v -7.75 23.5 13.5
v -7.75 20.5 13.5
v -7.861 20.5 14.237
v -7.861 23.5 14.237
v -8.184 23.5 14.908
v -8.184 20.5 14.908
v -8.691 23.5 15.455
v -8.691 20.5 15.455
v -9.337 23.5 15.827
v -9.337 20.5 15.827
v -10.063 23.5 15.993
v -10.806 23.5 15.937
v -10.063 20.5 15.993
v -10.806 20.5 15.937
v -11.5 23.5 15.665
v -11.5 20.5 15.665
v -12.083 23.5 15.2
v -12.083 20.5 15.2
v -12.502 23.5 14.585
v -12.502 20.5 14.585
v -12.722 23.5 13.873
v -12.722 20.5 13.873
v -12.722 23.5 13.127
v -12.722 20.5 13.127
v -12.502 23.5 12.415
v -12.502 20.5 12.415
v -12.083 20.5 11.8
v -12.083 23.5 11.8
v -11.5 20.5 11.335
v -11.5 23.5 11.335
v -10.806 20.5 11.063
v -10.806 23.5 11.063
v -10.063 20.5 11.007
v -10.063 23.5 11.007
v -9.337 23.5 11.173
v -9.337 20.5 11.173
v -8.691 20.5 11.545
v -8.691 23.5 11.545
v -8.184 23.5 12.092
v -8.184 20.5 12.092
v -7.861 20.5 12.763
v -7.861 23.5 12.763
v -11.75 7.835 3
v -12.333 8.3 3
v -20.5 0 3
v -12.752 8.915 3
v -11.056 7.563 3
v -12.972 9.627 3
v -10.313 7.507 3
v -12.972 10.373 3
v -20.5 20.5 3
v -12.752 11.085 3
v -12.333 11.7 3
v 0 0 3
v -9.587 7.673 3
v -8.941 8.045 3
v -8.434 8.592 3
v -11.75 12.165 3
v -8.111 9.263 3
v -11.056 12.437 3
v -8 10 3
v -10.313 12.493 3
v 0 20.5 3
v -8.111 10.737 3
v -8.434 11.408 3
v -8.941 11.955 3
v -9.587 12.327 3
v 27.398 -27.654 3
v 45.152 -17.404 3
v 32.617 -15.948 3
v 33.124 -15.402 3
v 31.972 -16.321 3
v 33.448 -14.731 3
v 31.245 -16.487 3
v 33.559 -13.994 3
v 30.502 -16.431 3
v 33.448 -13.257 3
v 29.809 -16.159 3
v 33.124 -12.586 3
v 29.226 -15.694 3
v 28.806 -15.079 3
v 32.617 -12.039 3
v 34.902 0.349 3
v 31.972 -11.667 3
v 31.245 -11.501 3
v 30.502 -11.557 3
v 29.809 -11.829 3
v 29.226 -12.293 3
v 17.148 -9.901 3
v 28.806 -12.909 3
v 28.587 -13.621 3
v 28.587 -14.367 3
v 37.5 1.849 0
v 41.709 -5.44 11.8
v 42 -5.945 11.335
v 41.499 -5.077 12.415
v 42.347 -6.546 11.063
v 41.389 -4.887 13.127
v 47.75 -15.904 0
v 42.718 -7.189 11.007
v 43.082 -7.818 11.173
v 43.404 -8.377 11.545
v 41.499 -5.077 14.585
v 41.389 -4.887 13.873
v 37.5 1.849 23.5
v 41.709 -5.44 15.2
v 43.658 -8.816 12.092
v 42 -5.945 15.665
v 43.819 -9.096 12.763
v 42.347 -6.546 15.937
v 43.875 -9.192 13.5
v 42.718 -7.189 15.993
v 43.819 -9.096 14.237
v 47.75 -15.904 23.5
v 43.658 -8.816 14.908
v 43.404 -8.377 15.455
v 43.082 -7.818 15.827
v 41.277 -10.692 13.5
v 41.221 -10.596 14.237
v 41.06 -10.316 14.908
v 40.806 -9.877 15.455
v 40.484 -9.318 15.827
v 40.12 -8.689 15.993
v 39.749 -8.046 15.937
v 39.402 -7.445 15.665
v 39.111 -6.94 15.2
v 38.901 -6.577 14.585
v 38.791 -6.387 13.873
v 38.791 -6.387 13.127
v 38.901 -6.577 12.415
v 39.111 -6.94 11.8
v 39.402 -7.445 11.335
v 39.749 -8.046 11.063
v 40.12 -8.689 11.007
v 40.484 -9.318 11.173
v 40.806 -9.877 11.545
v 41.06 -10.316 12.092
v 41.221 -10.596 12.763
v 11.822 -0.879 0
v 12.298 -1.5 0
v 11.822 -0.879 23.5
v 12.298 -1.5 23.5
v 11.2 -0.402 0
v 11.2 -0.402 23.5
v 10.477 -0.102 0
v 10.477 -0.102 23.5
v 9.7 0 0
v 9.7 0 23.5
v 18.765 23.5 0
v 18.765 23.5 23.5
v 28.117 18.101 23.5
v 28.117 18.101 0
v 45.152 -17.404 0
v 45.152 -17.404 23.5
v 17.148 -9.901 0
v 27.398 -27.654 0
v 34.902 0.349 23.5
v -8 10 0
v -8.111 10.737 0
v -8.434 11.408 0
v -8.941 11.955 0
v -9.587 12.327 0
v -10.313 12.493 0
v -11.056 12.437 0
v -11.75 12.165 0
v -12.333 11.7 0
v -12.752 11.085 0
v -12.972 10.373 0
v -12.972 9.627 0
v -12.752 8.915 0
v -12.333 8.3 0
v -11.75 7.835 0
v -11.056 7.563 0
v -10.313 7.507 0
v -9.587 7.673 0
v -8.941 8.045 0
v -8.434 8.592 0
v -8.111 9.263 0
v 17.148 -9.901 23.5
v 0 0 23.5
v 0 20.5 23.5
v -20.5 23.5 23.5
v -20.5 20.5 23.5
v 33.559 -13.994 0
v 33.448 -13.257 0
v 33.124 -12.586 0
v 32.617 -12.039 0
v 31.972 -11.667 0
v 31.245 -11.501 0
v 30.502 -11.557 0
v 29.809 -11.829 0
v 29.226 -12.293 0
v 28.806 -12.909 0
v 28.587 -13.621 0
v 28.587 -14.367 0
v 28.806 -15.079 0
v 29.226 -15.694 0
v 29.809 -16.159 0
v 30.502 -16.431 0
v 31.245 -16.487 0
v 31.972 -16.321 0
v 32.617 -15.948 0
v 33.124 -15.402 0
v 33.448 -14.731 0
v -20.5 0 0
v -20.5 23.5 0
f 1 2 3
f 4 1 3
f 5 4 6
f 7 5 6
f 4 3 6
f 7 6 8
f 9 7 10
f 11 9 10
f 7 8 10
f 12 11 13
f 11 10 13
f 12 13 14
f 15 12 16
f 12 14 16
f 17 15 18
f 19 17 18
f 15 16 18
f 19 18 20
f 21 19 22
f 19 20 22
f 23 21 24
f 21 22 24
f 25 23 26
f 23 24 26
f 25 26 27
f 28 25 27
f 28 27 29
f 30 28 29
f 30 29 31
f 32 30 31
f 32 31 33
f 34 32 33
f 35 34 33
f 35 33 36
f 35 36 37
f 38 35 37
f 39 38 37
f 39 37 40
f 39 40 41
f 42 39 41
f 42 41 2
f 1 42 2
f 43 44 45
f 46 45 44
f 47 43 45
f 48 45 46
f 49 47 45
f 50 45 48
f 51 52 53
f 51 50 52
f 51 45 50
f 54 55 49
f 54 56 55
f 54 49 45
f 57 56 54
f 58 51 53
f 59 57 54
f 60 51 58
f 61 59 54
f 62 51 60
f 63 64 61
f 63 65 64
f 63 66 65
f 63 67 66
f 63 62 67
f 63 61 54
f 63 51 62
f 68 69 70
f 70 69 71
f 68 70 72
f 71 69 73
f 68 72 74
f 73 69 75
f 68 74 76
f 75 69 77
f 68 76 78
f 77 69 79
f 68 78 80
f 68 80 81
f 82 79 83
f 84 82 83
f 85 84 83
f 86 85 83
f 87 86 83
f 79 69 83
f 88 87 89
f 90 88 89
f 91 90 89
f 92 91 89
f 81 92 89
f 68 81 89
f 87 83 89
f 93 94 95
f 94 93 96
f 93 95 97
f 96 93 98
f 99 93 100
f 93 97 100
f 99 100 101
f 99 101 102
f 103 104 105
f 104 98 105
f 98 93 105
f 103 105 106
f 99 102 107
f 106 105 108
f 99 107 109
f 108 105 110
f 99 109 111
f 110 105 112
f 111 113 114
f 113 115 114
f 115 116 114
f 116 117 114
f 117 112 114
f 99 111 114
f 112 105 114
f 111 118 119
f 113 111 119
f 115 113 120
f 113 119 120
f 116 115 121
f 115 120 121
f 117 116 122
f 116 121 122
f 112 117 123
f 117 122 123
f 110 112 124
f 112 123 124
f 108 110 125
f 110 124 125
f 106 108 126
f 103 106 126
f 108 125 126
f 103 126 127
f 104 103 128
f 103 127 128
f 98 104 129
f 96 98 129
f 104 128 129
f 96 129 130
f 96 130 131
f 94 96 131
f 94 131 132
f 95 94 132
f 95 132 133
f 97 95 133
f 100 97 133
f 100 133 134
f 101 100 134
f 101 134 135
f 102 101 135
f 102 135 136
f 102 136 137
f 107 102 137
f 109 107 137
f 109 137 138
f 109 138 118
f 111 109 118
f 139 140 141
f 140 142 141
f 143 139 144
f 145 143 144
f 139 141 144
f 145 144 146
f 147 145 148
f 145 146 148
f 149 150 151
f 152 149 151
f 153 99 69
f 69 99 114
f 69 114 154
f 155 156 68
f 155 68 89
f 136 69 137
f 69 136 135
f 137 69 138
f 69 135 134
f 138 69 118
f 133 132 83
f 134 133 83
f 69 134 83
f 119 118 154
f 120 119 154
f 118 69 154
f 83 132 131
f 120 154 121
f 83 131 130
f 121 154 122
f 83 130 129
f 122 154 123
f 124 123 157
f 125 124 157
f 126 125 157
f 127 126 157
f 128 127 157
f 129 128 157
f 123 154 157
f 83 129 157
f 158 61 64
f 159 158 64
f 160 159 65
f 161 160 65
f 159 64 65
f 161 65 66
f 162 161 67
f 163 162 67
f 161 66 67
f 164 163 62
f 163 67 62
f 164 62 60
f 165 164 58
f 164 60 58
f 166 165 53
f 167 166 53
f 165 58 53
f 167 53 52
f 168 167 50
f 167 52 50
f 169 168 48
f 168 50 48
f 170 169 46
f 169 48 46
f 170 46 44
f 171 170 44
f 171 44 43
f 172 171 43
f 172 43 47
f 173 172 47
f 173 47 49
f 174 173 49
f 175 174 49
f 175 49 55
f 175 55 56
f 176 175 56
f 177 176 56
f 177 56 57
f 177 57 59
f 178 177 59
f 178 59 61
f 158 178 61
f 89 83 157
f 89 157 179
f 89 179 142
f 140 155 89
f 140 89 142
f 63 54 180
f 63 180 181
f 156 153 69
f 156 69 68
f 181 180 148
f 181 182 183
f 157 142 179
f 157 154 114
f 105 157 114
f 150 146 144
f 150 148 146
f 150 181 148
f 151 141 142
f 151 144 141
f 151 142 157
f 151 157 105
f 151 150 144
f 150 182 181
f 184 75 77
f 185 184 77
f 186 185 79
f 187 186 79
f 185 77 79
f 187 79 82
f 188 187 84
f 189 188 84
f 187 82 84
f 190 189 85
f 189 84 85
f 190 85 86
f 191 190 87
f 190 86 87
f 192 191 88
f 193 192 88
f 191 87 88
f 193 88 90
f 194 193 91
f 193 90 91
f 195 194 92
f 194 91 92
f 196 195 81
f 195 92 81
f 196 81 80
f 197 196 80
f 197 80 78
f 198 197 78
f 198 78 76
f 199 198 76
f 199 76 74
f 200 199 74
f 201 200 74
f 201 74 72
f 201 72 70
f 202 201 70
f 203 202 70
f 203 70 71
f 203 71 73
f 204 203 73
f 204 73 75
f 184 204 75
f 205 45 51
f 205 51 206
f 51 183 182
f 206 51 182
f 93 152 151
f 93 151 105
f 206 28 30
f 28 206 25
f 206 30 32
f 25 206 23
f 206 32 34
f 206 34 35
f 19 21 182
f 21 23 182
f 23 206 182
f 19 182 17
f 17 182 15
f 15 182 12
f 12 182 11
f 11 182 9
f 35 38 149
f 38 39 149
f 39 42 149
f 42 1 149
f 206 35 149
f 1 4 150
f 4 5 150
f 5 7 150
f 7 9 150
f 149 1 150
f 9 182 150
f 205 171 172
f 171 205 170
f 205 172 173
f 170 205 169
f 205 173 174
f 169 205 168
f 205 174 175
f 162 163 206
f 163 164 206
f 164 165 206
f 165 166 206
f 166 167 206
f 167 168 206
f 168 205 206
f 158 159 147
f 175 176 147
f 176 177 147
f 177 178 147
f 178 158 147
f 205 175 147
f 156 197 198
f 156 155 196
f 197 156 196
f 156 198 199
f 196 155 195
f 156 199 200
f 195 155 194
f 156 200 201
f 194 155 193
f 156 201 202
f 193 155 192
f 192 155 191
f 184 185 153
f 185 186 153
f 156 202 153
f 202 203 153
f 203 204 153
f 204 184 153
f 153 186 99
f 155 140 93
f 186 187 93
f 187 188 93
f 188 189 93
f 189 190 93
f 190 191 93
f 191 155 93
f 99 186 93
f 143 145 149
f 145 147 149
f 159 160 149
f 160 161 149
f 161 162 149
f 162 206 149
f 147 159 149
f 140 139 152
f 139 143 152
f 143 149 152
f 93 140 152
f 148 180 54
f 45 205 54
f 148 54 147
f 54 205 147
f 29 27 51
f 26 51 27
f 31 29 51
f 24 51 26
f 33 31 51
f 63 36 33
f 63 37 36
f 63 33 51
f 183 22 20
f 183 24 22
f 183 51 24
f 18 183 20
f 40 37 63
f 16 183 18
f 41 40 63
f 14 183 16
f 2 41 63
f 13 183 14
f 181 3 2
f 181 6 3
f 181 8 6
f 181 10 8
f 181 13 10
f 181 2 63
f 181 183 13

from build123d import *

# Parameters (mm, degrees)
BOSS_EXTRUDE1_DEPTH   = 23.5
BOSS_EXTRUDE2_DEPTH   = 3
SKETCH2_W             = 20.5
SKETCH2_H             = 20.5
BOSS_EXTRUDE2_2_DEPTH = 3
SKETCH5_W             = 20.5
SKETCH5_H             = 3
BOSS_EXTRUDE4_DEPTH   = 23.5
FILLET5_R             = 3
CUT_EXTRUDE5_DEPTH    = 60.975535321
SKETCH16_R            = 2.5
CUT_EXTRUDE7_DEPTH    = 40
SKETCH17_R            = 2.5
CUT_EXTRUDE8_DEPTH    = 68.687454275
SKETCH23_R            = 2.5
CUT_EXTRUDE14_DEPTH   = 59.864801342


with BuildPart() as part:
    # Sketch1 → Boss-Extrude1 (new body)
    with BuildSketch(Plane.XY):
        Polygon((0, 0), (0, 23.5), (25, 23.5), (37.5, 1.849364905), (17.148403011, -9.900635095), (11.432268674, 0), align=None)
    extrude(amount=BOSS_EXTRUDE1_DEPTH)



with BuildPart() as body_2:
    # Sketch2 → Boss-Extrude2 (new body)
    with BuildSketch(Plane.XY):
        Polygon((17.148403011, -9.900635095), (34.901923789, 0.349364905), (45.151923789, -17.404155872), (27.398403011, -27.654155872), align=None)
    extrude(amount=BOSS_EXTRUDE2_DEPTH)


with BuildPart() as body_3:
    # Sketch2 → Boss-Extrude2 2 (new body)
    with BuildSketch(Plane.XY):
        with Locations((-10.25, 10.25)):
            Rectangle(SKETCH2_W, SKETCH2_H)
    extrude(amount=BOSS_EXTRUDE2_2_DEPTH)


with BuildPart() as part_1:
    add(part.part)

    add(body_2.part)  # Boss-Extrude4 merges body 2

    add(body_3.part)  # Boss-Extrude4 merges body 3
    # Sketch5 → Boss-Extrude4 (add)
    with BuildSketch(Plane.XY.offset(23.5)):
        with Locations((-10.25, 22)):
            Rectangle(SKETCH5_W, SKETCH5_H)
        Polygon((34.901923789, 0.349364905), (37.5, 1.849364905), (47.75, -15.904155872), (45.151923789, -17.404155872), align=None)
    extrude(amount=-BOSS_EXTRUDE4_DEPTH)

    # Fillet5
    fillet5_edges = [part_1.edges().sort_by_distance(p)[0] for p in [
        (11.432268674, 0, 11.75),
    ]]
    fillet(fillet5_edges, radius=FILLET5_R)

    # Sketch14 → Cut-Extrude5 (cut, through all)
    with BuildSketch(Plane.XY.offset(23.5)):
        Polygon((18.765371804, 23.5), (28.117314098, 18.100653599), (30.117314098, 21.564755215), (20.765371804, 26.964101615), align=None)
    extrude(amount=-CUT_EXTRUDE5_DEPTH, mode=Mode.SUBTRACT)

    # Sketch16 → Cut-Extrude7 (cut)
    with BuildSketch(Plane.XZ.offset(-20.5)):
        with Locations((-10.25, 13.5)):
            Circle(SKETCH16_R)
    extrude(amount=-CUT_EXTRUDE7_DEPTH, mode=Mode.SUBTRACT)

    # Sketch17 → Cut-Extrude8 (cut, through all)
    with BuildSketch(Plane(origin=(26.327722283, 15.200317547, 0), x_dir=(0, 0, 1), z_dir=(-0.8660254037844385, -0.5000000000000003, 0))):
        with Locations(Location((13.5, -27.398403011, 0), (0, 0, 270))):
            Circle(SKETCH17_R)
    extrude(amount=-CUT_EXTRUDE8_DEPTH, mode=Mode.SUBTRACT)

    # Sketch23 → Cut-Extrude14 (cut, through all)
    with BuildSketch(Plane.XY.offset(3)):
        with Locations((-10.5, 10)):
            Circle(SKETCH23_R)
        with Locations((31.058657049, -13.993901834)):
            Circle(SKETCH23_R)
    extrude(amount=-CUT_EXTRUDE14_DEPTH, mode=Mode.SUBTRACT)


solid = part_1.part
